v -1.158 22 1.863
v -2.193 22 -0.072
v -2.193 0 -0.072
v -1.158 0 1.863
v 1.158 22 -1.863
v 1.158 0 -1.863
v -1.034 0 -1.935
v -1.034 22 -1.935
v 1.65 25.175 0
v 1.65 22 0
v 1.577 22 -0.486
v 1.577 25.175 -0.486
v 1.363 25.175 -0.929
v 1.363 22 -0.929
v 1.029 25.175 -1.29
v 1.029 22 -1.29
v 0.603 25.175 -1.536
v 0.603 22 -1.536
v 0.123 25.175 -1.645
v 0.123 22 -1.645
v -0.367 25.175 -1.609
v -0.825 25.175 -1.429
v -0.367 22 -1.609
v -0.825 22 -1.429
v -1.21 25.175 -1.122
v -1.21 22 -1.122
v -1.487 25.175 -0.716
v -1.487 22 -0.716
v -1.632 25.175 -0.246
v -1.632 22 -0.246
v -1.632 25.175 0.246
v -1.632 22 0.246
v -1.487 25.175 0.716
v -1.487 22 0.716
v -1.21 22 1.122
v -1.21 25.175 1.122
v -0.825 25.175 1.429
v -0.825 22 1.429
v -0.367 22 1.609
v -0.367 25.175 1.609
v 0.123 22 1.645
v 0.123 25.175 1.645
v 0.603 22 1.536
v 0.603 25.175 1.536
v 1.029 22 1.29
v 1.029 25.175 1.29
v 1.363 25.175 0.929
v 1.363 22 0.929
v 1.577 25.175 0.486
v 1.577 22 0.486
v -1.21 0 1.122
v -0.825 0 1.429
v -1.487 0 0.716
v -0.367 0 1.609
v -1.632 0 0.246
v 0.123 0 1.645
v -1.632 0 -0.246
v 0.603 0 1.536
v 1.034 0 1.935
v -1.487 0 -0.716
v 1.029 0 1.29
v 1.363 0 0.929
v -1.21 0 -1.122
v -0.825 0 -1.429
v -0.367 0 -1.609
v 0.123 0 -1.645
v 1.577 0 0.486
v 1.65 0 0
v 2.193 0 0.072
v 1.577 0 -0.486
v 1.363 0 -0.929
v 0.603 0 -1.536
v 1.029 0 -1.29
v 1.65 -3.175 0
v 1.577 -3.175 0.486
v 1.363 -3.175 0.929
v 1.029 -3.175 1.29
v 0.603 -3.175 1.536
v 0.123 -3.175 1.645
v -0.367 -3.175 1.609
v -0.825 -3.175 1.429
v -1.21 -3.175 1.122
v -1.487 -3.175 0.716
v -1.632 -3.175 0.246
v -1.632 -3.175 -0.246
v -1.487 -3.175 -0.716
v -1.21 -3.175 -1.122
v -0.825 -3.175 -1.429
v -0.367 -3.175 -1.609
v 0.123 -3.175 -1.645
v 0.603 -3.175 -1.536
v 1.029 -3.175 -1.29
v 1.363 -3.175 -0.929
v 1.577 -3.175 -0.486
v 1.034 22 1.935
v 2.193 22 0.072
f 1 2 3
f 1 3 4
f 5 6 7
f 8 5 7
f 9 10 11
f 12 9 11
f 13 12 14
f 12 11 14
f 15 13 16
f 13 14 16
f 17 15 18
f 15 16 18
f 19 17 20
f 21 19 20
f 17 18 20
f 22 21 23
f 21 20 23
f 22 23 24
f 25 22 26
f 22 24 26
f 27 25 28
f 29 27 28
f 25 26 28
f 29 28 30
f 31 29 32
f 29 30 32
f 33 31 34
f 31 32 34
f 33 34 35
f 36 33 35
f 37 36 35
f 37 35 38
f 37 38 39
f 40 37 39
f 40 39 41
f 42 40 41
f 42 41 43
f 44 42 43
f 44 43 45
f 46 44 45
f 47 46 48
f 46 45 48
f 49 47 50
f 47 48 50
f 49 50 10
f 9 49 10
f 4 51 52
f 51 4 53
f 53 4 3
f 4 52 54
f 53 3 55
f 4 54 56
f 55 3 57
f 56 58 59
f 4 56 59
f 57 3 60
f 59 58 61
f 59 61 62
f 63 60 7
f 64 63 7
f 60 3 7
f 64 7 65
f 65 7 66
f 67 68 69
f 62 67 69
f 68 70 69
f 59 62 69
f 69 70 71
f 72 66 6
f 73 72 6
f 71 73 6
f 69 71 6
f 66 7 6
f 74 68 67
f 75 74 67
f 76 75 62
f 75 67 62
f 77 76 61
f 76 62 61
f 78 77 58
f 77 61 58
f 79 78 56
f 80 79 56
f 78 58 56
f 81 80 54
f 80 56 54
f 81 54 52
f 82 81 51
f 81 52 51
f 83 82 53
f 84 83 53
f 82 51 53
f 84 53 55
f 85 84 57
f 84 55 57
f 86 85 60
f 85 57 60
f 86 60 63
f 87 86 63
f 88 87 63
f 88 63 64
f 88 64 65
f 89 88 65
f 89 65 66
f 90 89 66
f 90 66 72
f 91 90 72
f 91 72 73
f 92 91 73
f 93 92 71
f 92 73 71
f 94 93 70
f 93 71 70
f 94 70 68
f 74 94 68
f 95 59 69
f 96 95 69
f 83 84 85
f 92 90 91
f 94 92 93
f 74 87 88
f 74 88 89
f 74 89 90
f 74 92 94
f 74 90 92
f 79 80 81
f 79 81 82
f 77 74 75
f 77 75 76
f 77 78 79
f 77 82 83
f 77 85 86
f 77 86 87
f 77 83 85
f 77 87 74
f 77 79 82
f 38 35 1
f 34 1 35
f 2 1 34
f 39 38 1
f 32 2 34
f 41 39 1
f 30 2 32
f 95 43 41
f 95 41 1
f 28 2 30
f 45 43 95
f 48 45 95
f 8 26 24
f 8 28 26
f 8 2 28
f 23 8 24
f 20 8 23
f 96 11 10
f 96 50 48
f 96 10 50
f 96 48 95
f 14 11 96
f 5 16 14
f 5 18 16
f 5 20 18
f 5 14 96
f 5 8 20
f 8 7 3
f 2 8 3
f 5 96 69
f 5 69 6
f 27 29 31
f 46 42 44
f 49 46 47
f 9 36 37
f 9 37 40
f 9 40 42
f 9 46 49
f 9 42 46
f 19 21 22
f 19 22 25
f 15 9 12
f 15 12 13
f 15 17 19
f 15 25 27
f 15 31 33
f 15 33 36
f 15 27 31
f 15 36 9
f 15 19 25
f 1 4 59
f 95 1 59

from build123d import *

# Parameters (mm, degrees)
BOSS_EXTRUDE1_DEPTH = 22
SKETCH2_R           = 1.65
BOSS_EXTRUDE2_DEPTH = 3.175
SKETCH3_R           = 1.65
BOSS_EXTRUDE3_DEPTH = 3.175


with BuildPart() as part:
    # Sketch1 → Boss-Extrude1 (new body)
    with BuildSketch(Plane(origin=(0, 0, 0), x_dir=(1, 0, 0), z_dir=(0, 1, 0))):
        Polygon((1.0344261, -1.934759928), (2.192764297, -0.071540683), (1.158338198, 1.863219245), (-1.0344261, 1.934759928), (-2.192764297, 0.071540683), (-1.158338198, -1.863219245), align=None)
    extrude(amount=BOSS_EXTRUDE1_DEPTH)

    # Sketch2 → Boss-Extrude2 (add)
    with BuildSketch(Plane(origin=(0, 22, 0), x_dir=(1, 0, 0), z_dir=(0, 1, 0))):
        Circle(SKETCH2_R)
    extrude(amount=BOSS_EXTRUDE2_DEPTH)

    # Sketch3 → Boss-Extrude3 (add)
    with BuildSketch(Plane.XZ):
        Circle(SKETCH3_R)
    extrude(amount=BOSS_EXTRUDE3_DEPTH)


solid = part.part
